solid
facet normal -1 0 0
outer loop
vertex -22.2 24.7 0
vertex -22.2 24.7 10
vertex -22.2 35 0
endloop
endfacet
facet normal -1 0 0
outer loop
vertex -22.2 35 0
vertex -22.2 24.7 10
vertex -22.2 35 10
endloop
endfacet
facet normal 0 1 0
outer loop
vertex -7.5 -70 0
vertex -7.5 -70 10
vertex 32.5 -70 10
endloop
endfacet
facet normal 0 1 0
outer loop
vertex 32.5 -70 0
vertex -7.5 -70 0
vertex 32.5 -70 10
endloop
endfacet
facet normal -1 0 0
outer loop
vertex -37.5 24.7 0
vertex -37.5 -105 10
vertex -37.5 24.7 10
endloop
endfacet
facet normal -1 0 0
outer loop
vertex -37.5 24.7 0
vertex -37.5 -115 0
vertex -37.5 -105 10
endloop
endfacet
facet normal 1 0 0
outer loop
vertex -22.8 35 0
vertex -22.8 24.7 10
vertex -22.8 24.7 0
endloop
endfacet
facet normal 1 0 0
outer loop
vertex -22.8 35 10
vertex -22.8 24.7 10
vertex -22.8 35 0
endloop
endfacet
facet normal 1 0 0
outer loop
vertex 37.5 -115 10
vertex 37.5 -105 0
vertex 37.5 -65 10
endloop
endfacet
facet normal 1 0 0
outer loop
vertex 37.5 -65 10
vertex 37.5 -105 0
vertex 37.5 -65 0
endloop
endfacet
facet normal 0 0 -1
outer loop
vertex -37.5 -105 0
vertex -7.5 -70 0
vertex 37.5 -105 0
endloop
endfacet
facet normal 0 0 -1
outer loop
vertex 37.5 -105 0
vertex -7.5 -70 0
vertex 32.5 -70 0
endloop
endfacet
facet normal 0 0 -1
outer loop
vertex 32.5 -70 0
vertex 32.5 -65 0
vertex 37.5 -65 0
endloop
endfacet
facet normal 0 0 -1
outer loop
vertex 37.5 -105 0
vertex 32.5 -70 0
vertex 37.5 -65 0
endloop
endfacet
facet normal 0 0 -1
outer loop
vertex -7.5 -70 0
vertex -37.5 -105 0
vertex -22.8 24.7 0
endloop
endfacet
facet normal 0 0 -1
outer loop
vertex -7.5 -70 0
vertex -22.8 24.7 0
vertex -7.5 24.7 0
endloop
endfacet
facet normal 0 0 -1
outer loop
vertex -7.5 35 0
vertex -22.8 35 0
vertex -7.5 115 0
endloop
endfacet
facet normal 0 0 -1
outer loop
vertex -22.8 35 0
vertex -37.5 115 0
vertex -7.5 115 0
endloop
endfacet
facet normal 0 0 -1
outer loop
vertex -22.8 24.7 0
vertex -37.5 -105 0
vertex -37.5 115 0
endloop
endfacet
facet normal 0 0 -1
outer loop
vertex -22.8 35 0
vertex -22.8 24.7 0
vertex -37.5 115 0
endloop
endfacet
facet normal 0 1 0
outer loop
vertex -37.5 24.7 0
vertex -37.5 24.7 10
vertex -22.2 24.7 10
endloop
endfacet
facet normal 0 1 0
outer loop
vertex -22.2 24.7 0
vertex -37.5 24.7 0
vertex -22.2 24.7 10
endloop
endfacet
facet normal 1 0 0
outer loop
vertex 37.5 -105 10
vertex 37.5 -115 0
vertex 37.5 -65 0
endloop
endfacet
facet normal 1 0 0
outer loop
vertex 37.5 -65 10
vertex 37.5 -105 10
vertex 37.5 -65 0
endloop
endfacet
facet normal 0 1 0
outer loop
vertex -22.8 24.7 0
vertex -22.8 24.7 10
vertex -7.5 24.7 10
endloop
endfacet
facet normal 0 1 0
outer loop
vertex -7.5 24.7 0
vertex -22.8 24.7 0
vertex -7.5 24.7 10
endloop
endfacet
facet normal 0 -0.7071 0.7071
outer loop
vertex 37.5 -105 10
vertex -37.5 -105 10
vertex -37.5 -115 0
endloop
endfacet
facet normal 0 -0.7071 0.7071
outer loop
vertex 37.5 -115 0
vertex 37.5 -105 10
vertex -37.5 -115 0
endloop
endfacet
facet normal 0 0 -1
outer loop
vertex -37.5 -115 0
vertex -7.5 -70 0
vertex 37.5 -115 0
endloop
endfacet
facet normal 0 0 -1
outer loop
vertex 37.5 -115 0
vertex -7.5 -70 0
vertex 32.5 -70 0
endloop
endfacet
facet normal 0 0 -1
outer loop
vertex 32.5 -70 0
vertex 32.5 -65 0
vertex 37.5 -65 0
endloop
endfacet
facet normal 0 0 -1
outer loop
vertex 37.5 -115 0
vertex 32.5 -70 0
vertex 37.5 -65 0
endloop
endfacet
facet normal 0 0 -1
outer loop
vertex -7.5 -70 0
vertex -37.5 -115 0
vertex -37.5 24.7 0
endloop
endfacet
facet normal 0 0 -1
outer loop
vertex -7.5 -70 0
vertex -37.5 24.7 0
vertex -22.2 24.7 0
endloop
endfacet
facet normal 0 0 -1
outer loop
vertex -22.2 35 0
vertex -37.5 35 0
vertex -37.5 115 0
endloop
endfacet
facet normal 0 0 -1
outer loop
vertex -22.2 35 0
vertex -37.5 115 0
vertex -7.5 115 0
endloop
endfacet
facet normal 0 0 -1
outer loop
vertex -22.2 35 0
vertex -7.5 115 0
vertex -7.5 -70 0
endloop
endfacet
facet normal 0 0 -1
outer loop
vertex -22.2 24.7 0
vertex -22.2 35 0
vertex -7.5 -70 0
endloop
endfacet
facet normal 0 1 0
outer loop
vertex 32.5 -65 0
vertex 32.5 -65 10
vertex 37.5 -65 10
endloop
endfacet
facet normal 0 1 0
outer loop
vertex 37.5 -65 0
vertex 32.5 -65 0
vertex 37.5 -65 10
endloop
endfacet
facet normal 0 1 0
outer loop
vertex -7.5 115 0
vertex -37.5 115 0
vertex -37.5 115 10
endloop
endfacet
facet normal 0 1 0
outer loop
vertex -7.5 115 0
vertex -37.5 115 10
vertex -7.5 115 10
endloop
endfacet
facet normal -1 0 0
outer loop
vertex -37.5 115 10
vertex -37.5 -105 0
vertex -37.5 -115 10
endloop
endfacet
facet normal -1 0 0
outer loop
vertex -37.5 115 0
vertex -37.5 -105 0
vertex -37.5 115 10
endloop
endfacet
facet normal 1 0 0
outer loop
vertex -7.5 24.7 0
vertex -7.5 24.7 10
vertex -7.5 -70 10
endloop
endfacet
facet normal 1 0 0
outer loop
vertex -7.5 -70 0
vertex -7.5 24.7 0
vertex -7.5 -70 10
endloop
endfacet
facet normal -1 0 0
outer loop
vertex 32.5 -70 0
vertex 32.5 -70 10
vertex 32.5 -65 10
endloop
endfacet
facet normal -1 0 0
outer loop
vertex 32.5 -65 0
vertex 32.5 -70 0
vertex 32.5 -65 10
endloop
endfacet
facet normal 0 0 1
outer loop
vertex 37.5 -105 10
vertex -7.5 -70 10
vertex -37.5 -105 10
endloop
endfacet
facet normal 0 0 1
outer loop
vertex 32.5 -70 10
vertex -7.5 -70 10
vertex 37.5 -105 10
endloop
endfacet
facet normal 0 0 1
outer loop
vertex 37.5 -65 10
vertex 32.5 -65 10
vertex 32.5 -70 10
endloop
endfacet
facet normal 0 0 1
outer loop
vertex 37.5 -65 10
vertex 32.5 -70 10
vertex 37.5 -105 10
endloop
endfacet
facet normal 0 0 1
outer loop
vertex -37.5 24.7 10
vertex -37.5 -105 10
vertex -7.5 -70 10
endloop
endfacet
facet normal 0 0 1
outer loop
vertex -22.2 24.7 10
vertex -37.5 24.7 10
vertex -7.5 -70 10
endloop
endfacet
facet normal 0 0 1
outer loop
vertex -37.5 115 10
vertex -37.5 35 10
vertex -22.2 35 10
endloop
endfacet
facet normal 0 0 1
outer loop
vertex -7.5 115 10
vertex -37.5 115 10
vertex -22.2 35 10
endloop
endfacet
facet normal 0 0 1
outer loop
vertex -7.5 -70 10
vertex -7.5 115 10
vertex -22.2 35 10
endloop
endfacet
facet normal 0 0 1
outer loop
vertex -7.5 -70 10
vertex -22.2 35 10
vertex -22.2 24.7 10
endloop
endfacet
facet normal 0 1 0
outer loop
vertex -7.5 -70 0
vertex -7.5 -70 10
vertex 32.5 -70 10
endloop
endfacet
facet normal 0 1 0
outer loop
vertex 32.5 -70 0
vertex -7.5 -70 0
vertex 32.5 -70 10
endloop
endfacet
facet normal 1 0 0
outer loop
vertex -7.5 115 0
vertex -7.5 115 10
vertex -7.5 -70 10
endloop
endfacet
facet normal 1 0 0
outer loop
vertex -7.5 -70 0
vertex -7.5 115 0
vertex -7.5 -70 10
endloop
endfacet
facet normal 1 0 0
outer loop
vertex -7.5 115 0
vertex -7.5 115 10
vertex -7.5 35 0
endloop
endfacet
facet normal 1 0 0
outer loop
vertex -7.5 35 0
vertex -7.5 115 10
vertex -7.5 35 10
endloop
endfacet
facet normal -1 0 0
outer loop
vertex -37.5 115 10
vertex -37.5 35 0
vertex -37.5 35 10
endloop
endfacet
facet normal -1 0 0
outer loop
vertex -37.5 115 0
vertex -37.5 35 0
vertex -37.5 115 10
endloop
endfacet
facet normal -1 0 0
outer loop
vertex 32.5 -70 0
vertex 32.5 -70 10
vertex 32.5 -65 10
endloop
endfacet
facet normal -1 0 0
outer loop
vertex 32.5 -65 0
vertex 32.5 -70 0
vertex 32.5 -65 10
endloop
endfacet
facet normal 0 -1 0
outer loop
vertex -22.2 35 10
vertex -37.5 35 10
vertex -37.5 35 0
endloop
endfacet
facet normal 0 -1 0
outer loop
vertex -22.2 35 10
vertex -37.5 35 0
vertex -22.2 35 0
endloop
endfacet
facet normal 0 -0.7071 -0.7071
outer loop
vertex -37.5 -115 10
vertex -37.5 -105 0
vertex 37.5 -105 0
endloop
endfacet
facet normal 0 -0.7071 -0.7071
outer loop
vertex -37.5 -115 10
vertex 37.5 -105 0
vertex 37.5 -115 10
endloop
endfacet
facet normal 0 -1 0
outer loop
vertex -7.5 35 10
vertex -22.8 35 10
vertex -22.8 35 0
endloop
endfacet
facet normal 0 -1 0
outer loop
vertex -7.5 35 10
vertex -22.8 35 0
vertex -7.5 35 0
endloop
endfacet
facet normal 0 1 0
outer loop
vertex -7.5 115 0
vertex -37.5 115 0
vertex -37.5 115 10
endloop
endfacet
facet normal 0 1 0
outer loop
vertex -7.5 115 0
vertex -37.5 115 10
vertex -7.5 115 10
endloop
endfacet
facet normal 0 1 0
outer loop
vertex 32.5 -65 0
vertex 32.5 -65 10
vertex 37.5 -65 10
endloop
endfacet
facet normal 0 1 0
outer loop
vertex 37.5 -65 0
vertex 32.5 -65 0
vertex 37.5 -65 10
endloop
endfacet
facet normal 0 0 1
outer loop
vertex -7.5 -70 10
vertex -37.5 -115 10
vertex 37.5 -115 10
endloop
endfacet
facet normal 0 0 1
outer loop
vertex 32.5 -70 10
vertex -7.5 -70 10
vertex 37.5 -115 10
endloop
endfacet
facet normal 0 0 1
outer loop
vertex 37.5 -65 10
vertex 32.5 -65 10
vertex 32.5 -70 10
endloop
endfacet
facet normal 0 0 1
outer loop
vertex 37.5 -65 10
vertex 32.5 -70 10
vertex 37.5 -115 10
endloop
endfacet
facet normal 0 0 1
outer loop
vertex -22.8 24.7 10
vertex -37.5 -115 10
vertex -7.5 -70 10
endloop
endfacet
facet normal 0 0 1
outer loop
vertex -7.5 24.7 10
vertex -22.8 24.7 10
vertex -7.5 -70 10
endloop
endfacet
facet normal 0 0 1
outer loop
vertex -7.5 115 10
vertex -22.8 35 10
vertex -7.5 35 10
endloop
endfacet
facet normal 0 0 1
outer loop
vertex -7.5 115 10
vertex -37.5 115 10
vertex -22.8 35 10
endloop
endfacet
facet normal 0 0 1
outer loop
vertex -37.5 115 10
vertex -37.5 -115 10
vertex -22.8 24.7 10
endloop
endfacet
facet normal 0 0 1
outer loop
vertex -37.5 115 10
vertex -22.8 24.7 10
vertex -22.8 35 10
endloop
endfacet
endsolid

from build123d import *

# Parameters (mm, degrees)
SKETCH_W        = 75
SKETCH_H        = 230
PAD_DEPTH       = 10
POCKET_DEPTH    = 75
SKETCH004_W     = 15.3
SKETCH004_H     = 10.3
POCKET002_DEPTH = 10
POCKET003_DEPTH = 10
SKETCH001_W     = 75
SKETCH001_H     = 230
PAD001_DEPTH    = 10
POCKET001_DEPTH = 75
SKETCH006_W     = 15.3
SKETCH006_H     = 10.3
POCKET004_DEPTH = 10
POCKET005_DEPTH = 10


with BuildPart() as left_hook:
    # Sketch → Pad (new body)
    with BuildSketch(Plane.XY):
        Rectangle(SKETCH_W, SKETCH_H)
    extrude(amount=PAD_DEPTH)

    # Sketch002 (on DatumPlane) → Pocket (cut)
    with BuildSketch(Plane.YZ.offset(37.5)):
        Polygon((-115, 0), (-115, 10), (-105, 10), align=None)
    extrude(amount=-POCKET_DEPTH, mode=Mode.SUBTRACT)

    # Sketch004 (on DatumPlane) → Pocket002 (cut)
    with BuildSketch(Plane.XY.offset(10)):
        with Locations((-29.85, 29.85)):
            Rectangle(SKETCH004_W, SKETCH004_H)
    extrude(amount=-POCKET002_DEPTH, mode=Mode.SUBTRACT)

    # Sketch005 (on DatumPlane) → Pocket003 (cut)
    with BuildSketch(Plane.XY.offset(10)):
        Polygon((37.5, 115), (-7.5, 115), (-7.5, -70), (32.5, -70), (32.5, -65), (37.5, -65), align=None)
    extrude(amount=-POCKET003_DEPTH, mode=Mode.SUBTRACT)


with BuildPart() as right_hook:
    # Sketch001 → Pad001 (new body)
    with BuildSketch(Plane.XY):
        Rectangle(SKETCH001_W, SKETCH001_H)
    extrude(amount=PAD001_DEPTH)

    # Sketch003 (on DatumPlane) → Pocket001 (cut)
    with BuildSketch(Plane.YZ.offset(37.5)):
        Polygon((-115, 0), (-105, 0), (-115, 10), align=None)
    extrude(amount=-POCKET001_DEPTH, mode=Mode.SUBTRACT)

    # Sketch006 (on DatumPlane) → Pocket004 (cut)
    with BuildSketch(Plane.XY.offset(10)):
        with Locations((-15.15, 29.85)):
            Rectangle(SKETCH006_W, SKETCH006_H)
    extrude(amount=-POCKET004_DEPTH, mode=Mode.SUBTRACT)

    # Sketch007 (on DatumPlane) → Pocket005 (cut)
    with BuildSketch(Plane.XY.offset(10)):
        Polygon((-7.5, 115), (-7.5, -70), (32.5, -70), (32.5, -65), (37.5, -65), (37.5, 115), align=None)
    extrude(amount=-POCKET005_DEPTH, mode=Mode.SUBTRACT)


solid = Compound([left_hook.part, right_hook.part])
